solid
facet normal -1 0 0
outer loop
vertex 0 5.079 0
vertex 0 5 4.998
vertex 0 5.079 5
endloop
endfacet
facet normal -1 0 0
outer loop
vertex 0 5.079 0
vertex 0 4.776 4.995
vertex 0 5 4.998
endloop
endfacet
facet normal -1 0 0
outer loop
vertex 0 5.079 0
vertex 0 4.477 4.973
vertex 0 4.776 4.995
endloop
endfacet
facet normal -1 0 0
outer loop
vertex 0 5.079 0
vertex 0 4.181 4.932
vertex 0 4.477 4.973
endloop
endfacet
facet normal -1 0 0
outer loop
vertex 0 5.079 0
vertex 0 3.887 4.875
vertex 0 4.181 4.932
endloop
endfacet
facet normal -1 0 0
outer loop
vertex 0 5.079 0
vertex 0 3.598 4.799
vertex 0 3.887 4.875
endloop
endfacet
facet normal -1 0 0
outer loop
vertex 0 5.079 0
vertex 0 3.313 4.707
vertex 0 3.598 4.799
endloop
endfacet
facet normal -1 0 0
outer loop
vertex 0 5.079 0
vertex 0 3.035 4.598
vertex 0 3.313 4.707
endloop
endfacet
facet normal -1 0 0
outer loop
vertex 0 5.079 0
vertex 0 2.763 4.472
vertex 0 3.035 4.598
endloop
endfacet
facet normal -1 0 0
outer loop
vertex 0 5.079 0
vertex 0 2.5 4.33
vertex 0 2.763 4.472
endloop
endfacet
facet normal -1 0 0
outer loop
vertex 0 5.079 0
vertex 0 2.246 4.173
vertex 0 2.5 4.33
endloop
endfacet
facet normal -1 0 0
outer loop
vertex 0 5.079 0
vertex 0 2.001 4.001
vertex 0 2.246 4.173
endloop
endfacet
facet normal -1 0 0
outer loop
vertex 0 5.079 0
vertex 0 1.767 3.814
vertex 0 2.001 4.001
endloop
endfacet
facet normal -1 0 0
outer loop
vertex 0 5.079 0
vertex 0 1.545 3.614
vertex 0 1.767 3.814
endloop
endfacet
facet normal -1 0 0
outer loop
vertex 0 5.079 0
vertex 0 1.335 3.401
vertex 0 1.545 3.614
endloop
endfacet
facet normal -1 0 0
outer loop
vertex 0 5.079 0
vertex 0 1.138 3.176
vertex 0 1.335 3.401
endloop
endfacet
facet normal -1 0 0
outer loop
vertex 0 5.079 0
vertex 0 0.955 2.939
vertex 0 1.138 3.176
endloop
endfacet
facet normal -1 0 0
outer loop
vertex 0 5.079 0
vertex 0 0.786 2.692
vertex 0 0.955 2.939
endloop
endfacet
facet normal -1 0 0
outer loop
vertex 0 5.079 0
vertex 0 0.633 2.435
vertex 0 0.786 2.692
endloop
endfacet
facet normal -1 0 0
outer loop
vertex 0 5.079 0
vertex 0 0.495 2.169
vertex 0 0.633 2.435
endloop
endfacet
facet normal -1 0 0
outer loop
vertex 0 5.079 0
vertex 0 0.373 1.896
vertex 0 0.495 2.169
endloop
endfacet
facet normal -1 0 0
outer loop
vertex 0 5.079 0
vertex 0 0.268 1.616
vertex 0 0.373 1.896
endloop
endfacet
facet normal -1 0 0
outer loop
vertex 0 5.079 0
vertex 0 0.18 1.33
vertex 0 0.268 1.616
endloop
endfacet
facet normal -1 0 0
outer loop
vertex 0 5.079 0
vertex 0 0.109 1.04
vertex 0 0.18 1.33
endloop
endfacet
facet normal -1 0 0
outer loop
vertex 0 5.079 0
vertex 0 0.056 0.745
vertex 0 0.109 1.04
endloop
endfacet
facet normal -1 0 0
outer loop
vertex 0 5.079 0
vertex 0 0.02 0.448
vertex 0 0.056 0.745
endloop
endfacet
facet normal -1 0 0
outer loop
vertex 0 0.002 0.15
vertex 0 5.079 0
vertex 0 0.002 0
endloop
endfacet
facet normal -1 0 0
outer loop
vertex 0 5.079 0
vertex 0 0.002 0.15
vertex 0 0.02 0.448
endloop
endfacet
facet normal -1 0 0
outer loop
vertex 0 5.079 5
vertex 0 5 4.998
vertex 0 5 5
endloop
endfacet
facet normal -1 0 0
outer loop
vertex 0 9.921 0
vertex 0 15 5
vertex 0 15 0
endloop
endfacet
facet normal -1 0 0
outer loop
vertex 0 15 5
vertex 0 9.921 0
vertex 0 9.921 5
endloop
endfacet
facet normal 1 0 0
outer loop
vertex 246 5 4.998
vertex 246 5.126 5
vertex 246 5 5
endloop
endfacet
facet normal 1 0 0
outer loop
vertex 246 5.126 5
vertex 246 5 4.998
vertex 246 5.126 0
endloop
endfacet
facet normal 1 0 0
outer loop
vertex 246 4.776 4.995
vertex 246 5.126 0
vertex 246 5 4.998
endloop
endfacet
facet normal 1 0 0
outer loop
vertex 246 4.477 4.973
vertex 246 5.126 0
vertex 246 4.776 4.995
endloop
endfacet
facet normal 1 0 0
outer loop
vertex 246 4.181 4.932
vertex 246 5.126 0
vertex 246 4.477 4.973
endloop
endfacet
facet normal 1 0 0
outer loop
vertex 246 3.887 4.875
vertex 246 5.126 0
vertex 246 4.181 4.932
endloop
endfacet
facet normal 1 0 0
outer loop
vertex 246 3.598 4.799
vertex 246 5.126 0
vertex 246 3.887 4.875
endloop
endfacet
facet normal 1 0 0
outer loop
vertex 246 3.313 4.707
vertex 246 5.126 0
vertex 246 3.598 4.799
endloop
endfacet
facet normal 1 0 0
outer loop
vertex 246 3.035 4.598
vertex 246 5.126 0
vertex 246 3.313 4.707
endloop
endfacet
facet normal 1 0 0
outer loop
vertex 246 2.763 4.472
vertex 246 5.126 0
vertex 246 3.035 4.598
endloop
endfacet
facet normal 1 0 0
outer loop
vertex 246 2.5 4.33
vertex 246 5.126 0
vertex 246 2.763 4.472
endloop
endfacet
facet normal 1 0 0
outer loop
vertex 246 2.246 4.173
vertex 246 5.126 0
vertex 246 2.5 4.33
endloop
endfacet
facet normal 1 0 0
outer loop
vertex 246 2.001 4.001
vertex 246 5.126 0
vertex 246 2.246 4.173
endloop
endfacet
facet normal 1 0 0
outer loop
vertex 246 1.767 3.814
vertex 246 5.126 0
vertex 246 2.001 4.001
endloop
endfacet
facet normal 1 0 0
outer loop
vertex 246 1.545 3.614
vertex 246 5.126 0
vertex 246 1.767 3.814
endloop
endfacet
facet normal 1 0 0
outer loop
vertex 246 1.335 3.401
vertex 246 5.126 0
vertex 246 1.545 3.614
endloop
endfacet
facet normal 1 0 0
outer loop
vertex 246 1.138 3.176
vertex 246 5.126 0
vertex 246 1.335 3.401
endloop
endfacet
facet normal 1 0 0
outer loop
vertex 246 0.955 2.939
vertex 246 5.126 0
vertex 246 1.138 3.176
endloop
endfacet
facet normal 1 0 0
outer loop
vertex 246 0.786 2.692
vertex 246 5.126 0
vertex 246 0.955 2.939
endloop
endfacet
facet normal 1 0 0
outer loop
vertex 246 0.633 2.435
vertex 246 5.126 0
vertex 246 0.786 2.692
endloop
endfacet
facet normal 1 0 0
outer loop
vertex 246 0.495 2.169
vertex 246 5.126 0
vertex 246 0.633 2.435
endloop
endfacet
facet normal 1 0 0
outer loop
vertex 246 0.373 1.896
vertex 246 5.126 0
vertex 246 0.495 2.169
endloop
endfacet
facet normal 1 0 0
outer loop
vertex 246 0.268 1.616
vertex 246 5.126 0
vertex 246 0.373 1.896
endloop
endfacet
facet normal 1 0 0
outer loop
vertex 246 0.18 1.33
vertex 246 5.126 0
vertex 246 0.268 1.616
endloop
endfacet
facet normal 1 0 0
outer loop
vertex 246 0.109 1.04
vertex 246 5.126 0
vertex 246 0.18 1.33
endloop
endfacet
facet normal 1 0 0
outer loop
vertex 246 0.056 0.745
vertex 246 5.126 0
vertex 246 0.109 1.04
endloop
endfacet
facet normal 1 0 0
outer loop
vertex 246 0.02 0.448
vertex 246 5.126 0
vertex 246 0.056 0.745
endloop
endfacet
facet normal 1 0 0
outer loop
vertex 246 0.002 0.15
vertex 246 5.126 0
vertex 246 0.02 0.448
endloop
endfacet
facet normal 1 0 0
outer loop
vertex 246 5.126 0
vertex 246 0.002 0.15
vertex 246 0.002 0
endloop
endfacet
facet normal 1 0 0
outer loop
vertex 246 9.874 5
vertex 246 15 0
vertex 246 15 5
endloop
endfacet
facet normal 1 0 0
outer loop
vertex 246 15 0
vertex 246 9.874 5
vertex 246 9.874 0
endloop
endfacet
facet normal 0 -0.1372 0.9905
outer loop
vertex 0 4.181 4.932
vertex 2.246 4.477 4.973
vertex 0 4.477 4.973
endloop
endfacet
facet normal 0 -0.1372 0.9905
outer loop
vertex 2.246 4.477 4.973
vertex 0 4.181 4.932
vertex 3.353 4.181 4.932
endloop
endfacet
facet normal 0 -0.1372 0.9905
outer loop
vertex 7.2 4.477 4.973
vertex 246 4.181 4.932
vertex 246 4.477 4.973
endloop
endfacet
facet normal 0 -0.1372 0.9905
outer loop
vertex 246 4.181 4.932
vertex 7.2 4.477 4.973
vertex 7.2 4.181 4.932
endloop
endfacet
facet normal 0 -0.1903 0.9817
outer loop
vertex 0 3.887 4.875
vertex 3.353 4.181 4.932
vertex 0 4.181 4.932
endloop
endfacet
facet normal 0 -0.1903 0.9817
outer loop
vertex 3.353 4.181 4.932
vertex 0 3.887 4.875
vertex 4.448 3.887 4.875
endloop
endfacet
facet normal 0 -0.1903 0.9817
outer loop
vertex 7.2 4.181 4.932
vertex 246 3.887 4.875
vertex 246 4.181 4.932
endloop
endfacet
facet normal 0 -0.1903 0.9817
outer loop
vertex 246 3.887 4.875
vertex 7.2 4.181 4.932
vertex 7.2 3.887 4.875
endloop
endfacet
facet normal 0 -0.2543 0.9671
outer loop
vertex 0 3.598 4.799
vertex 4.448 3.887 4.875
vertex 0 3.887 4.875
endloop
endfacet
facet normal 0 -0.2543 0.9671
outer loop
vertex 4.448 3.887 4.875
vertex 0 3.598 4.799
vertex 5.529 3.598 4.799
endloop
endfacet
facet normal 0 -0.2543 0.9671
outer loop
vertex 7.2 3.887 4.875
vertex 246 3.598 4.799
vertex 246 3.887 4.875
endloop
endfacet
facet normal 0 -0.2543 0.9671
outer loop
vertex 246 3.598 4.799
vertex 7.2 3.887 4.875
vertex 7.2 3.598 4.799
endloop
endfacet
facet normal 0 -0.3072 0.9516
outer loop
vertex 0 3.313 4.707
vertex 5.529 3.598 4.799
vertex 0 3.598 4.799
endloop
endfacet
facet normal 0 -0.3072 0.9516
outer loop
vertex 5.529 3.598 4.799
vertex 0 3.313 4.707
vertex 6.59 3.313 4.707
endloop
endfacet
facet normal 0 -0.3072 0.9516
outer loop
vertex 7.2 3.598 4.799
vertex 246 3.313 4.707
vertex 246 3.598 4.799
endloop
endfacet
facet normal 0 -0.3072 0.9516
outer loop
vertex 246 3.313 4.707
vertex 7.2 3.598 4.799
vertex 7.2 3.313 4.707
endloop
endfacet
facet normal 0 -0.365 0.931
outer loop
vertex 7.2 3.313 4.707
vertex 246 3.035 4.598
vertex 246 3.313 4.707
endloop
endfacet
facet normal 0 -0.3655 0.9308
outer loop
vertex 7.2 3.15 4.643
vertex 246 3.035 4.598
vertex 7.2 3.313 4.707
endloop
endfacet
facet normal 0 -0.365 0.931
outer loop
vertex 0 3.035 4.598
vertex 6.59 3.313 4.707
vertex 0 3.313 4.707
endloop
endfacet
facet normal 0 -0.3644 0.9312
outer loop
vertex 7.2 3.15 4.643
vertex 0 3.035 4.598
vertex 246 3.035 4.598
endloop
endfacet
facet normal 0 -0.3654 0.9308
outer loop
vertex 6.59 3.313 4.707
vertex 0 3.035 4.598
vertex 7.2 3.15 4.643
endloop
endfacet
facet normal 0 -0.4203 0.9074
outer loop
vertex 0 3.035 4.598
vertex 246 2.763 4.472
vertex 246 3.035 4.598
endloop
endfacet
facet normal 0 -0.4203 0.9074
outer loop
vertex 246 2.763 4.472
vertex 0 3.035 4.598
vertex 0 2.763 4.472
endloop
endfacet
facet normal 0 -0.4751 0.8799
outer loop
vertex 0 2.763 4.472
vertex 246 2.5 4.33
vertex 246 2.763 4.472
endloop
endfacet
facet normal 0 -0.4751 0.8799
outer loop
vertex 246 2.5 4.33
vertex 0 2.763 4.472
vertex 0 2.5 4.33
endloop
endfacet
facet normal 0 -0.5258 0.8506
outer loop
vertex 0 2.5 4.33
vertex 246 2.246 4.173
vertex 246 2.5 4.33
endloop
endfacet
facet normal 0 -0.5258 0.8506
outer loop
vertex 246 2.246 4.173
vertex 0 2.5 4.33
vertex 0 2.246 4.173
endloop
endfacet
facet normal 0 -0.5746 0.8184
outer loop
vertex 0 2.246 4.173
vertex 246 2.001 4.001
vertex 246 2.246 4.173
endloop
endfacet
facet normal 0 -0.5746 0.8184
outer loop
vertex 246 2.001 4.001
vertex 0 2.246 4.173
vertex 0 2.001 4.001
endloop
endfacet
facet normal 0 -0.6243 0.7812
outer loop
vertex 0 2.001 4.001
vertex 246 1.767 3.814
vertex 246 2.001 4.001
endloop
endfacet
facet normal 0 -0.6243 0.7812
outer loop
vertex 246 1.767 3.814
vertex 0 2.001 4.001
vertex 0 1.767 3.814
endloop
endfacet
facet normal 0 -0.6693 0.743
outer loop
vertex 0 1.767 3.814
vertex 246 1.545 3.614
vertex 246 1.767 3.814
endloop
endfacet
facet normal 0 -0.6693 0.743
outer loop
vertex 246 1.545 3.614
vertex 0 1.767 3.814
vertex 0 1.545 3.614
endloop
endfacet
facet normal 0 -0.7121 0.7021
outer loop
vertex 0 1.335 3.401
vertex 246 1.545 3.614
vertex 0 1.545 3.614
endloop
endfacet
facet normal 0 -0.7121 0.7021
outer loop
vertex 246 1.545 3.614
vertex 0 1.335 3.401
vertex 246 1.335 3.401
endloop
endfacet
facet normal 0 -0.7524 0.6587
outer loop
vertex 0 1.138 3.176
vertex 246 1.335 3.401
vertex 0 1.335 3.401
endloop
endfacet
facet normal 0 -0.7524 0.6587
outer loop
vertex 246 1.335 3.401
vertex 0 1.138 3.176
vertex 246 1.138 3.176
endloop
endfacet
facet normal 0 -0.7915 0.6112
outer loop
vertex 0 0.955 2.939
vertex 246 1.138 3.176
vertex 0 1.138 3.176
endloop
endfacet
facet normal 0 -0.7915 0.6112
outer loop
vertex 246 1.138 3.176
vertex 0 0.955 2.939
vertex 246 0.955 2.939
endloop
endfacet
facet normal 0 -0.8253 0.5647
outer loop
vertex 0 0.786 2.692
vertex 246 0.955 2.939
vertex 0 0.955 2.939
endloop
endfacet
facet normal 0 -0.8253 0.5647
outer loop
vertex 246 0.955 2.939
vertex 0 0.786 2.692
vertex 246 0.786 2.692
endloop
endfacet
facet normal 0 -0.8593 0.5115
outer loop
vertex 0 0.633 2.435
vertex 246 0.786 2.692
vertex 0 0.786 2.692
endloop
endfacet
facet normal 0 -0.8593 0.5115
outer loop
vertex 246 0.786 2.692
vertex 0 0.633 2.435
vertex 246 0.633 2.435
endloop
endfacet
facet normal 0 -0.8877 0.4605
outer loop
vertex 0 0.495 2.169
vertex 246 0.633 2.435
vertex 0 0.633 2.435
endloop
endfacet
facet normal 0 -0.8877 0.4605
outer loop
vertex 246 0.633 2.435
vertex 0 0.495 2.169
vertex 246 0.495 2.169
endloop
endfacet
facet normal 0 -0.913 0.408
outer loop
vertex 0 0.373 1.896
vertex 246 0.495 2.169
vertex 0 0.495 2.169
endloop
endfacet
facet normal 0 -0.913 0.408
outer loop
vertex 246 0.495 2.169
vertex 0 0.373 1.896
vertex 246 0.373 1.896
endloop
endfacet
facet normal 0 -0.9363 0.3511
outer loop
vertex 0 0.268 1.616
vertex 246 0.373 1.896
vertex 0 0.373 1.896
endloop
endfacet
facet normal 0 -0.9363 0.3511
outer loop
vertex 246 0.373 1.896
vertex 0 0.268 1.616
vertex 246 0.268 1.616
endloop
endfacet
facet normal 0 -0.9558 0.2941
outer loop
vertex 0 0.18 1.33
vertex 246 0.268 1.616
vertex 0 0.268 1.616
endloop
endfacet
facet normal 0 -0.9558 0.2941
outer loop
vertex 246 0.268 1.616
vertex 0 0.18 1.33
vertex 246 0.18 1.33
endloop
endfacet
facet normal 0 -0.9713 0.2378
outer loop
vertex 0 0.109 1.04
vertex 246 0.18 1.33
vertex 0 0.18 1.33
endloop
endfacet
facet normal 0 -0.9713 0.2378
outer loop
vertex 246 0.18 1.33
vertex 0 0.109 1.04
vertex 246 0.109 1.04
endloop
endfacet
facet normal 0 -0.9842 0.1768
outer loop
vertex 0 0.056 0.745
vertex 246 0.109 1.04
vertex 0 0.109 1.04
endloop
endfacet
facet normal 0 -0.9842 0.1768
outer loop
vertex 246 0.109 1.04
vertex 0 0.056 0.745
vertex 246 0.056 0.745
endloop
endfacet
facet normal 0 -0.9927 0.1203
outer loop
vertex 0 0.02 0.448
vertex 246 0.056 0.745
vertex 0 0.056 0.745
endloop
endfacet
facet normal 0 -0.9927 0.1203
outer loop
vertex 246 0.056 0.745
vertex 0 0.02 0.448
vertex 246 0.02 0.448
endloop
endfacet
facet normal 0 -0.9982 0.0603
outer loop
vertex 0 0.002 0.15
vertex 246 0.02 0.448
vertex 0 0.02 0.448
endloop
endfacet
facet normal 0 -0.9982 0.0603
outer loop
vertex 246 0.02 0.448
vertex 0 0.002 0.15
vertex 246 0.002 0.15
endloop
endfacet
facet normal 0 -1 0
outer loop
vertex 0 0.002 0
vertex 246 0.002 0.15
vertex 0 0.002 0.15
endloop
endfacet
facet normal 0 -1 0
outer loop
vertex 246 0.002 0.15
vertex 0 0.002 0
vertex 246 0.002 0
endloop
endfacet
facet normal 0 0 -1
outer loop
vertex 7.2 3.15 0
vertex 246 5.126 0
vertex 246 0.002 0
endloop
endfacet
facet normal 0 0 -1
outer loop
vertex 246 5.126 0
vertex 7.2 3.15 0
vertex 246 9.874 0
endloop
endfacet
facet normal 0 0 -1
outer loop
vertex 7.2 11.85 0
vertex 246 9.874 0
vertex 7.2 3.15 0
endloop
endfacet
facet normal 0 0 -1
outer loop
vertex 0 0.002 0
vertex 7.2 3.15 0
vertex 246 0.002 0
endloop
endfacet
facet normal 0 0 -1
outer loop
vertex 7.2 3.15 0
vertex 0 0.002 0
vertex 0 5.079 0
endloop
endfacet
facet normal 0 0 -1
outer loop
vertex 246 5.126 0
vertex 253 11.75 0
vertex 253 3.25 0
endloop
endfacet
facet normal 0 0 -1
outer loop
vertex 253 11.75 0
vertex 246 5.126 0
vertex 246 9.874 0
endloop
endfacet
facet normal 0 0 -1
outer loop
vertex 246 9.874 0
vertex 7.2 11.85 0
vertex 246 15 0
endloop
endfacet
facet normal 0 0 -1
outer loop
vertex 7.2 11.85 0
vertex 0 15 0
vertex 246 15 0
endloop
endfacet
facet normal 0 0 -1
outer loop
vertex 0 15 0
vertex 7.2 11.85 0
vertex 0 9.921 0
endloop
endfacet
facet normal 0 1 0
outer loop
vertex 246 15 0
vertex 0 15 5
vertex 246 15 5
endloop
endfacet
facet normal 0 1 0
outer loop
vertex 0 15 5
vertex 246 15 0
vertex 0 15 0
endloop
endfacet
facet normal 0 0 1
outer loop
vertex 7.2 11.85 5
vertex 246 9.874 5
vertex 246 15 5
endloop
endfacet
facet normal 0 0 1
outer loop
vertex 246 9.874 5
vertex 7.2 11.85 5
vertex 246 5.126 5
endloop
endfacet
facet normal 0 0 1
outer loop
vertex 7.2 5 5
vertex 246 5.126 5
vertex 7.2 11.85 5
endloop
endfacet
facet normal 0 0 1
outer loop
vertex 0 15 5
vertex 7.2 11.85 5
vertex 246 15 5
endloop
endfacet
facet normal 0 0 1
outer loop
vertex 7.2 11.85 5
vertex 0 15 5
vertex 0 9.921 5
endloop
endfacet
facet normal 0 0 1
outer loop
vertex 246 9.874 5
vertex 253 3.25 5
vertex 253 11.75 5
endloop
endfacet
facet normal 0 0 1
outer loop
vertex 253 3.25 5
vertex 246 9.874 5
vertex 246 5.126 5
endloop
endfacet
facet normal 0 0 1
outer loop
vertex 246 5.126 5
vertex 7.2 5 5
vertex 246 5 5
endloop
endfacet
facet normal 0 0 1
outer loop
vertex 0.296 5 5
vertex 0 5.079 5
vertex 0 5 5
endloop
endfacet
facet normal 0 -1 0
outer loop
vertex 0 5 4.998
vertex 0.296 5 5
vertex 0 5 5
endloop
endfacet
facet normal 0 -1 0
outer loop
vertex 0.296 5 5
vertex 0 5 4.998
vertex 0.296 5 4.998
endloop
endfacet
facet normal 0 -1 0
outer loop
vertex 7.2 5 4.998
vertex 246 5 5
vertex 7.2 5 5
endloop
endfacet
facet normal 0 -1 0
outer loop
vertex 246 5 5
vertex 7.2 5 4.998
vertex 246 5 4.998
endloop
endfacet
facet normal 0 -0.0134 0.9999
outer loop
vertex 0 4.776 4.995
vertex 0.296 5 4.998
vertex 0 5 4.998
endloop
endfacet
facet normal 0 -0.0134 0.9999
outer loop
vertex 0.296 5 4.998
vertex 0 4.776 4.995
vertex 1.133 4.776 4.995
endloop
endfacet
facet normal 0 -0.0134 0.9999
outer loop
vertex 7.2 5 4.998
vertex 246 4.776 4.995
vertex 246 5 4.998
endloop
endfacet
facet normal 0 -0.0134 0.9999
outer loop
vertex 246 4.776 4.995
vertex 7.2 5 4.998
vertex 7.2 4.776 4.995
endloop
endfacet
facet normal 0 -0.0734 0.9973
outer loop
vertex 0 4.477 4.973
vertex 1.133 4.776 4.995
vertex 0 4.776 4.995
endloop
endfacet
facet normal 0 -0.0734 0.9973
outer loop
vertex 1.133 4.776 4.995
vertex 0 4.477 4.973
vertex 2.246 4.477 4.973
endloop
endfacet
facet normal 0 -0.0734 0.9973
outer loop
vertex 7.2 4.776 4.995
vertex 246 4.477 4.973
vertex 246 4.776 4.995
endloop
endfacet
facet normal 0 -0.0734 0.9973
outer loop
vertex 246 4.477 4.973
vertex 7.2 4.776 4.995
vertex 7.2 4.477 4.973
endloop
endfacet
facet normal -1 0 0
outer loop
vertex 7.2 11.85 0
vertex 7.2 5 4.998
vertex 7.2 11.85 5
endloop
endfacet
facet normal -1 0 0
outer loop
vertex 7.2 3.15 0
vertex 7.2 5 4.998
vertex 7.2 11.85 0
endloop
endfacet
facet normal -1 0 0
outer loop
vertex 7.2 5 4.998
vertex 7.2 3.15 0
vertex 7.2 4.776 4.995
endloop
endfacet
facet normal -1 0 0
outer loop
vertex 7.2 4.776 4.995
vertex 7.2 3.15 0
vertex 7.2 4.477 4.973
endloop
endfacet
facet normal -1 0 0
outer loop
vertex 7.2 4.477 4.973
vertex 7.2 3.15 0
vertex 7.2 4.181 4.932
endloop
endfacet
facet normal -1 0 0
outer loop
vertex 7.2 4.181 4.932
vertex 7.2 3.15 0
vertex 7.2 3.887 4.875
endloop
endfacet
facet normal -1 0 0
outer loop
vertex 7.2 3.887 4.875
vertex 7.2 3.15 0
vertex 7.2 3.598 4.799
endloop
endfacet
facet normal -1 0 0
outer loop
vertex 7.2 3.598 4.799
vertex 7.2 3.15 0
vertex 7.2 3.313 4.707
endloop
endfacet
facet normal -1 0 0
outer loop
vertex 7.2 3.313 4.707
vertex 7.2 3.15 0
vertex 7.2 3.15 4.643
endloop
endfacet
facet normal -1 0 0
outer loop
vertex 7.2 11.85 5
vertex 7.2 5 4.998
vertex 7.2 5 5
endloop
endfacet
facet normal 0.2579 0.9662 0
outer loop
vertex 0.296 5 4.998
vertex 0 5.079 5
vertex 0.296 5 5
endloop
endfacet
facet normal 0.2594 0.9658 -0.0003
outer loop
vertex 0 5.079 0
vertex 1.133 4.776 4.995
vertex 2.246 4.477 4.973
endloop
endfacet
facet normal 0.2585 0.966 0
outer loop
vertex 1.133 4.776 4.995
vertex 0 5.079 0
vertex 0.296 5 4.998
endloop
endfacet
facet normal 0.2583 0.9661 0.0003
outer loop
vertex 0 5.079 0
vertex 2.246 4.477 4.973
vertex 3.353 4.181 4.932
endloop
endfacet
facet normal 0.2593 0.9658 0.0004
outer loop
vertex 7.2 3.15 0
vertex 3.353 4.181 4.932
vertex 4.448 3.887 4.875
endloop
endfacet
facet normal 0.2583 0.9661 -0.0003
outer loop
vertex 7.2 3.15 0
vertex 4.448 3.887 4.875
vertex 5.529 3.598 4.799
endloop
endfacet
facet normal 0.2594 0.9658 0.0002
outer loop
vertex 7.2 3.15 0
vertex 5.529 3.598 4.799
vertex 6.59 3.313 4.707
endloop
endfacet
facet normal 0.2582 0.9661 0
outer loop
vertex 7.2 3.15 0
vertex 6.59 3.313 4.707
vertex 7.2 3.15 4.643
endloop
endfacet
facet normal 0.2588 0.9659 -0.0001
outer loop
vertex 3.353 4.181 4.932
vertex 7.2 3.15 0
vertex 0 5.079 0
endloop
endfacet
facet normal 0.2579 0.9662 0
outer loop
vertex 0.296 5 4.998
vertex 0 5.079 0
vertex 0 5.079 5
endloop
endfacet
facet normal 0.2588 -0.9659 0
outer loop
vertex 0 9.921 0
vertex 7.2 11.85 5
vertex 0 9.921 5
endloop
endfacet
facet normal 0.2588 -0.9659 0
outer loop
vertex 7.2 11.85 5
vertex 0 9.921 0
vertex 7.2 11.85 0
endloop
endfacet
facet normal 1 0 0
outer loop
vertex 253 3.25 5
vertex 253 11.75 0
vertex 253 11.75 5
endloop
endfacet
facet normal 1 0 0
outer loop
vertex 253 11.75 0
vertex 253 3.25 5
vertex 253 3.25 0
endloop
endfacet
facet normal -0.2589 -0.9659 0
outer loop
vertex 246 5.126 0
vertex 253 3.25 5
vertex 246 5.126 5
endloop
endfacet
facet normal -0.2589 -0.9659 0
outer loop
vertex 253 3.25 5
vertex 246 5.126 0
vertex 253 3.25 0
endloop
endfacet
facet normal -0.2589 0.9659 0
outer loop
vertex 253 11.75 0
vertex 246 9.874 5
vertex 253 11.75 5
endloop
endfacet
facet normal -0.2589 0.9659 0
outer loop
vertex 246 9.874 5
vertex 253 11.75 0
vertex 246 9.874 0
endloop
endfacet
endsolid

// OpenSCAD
/*

  Board game tile edges
    by Mark van Renswoude

  https://www.thingiverse.com/thing:2954641
*/



/*

  Configuration for Thingiverse Customizer

*/

// Select part to output
part = "straight"; // [straight:Straight connector,cornermale:Corner male,cornerfemale:Corner female]

// The length of a tile for corner edges (millimeters)
TileLengthCorner = 255;

// The length of a tile for straight edges (millimeters)
TileLengthStraight = 246;

// The width of the edge (millimeters)
EdgeWidth = 15;

// The height of the edge (millimeters)
EdgeHeight = 5;

// The angle of the connectors (degrees)
ConnectorAngle = 75; // [45:5:80]

// How far the connector overlaps into the next piece (millimeters)
ConnectorDepth = 7;

// The width of the tip of the connector (millimeters)
ConnectorWidth = 8.5;

// Extra margin in the female connector (millimeters)
ConnectorMargin = 0.2;

// Offset for the corner connectors from the inside (percentage)
ConnectorCornerOffset = 25; // [0:5:100]


/*

  Part setup

*/
$fa = 1;
$fs = 0.3;

displayPart();



module displayPart()
{
  if (part == "straight")
  {
    partStraight();
  }
  else if (part == "cornermale")
  {
    partCornerMale();
  }
  else if (part == "cornerfemale")
  {
    partCornerFemale();
  }
}



/*

  Parts

*/
module partStraight()
{
  difference()
  {
    edge(TileLengthStraight);
    translate([0, EdgeWidth / 2, 0])
      connectorFemale();
  }

  translate([TileLengthStraight, EdgeWidth / 2, 0])
    connectorMale();
}


module partCornerMale()
{
  difference()
  {
    edge(TileLengthCorner + EdgeWidth);

    translate([0, EdgeWidth / 2, 0])
      connectorFemale();

    translate([TileLengthCorner, 0, 0])
      linear_extrude(EdgeHeight)
        polygon([
          [0, EdgeWidth],
          [EdgeWidth, EdgeWidth],
          [EdgeWidth, 0]
        ]);
  }

  connectorOffset = ConnectorCornerOffset / 100;

  translate([TileLengthCorner + (EdgeWidth * connectorOffset), EdgeWidth * (1 - connectorOffset), 0])
    rotate([0, 0, 45])
      connectorMale();
}


module partCornerFemale()
{
  difference()
  {
    edge(TileLengthCorner + EdgeWidth);

      linear_extrude(EdgeHeight)
        polygon([
          [0, 0],
          [0, EdgeWidth],
          [EdgeWidth, EdgeWidth]
        ]);

    connectorOffset = ConnectorCornerOffset / 100;

    translate([EdgeWidth * (1 - connectorOffset), EdgeWidth * (1 - connectorOffset), 0])
      rotate([0, 0, -45])
        connectorFemale();
  }

  connectorOffset = ConnectorCornerOffset / 100;

  translate([TileLengthCorner + EdgeWidth, EdgeWidth / 2, 0])
    connectorMale();
}


/*

  Basic elements

*/
module connector(depth, width)
{
  diff = depth / tan(ConnectorAngle);

  // Assume we're translated to the center of the edge
  //
  //        /|
  // 0,0 _ | |
  //       | |
  //        \|
  linear_extrude(EdgeHeight)
    polygon([
      [0, (width / 2) - diff],
      [depth, width / 2],
      [depth, -(width / 2)],
      [0, -((width / 2) - diff)]
    ]);
}


module connectorMale()
{
  connector(ConnectorDepth, ConnectorWidth);
}


module connectorFemale()
{
  connector(ConnectorDepth + ConnectorMargin, ConnectorWidth + ConnectorMargin);
}


module edge(length)
{
  rotate([90, 0, 90])
    linear_extrude(length)
      union()
      {
        // Rounded outer edge
        intersection()
        {
          square(EdgeHeight);
          translate([EdgeHeight, 0, 0])
            circle(EdgeHeight);
        }

        // Remaining width (assumes width > height)
        translate([EdgeHeight, 0, 0])
          square([EdgeWidth - EdgeHeight, EdgeHeight]);
      }
}
